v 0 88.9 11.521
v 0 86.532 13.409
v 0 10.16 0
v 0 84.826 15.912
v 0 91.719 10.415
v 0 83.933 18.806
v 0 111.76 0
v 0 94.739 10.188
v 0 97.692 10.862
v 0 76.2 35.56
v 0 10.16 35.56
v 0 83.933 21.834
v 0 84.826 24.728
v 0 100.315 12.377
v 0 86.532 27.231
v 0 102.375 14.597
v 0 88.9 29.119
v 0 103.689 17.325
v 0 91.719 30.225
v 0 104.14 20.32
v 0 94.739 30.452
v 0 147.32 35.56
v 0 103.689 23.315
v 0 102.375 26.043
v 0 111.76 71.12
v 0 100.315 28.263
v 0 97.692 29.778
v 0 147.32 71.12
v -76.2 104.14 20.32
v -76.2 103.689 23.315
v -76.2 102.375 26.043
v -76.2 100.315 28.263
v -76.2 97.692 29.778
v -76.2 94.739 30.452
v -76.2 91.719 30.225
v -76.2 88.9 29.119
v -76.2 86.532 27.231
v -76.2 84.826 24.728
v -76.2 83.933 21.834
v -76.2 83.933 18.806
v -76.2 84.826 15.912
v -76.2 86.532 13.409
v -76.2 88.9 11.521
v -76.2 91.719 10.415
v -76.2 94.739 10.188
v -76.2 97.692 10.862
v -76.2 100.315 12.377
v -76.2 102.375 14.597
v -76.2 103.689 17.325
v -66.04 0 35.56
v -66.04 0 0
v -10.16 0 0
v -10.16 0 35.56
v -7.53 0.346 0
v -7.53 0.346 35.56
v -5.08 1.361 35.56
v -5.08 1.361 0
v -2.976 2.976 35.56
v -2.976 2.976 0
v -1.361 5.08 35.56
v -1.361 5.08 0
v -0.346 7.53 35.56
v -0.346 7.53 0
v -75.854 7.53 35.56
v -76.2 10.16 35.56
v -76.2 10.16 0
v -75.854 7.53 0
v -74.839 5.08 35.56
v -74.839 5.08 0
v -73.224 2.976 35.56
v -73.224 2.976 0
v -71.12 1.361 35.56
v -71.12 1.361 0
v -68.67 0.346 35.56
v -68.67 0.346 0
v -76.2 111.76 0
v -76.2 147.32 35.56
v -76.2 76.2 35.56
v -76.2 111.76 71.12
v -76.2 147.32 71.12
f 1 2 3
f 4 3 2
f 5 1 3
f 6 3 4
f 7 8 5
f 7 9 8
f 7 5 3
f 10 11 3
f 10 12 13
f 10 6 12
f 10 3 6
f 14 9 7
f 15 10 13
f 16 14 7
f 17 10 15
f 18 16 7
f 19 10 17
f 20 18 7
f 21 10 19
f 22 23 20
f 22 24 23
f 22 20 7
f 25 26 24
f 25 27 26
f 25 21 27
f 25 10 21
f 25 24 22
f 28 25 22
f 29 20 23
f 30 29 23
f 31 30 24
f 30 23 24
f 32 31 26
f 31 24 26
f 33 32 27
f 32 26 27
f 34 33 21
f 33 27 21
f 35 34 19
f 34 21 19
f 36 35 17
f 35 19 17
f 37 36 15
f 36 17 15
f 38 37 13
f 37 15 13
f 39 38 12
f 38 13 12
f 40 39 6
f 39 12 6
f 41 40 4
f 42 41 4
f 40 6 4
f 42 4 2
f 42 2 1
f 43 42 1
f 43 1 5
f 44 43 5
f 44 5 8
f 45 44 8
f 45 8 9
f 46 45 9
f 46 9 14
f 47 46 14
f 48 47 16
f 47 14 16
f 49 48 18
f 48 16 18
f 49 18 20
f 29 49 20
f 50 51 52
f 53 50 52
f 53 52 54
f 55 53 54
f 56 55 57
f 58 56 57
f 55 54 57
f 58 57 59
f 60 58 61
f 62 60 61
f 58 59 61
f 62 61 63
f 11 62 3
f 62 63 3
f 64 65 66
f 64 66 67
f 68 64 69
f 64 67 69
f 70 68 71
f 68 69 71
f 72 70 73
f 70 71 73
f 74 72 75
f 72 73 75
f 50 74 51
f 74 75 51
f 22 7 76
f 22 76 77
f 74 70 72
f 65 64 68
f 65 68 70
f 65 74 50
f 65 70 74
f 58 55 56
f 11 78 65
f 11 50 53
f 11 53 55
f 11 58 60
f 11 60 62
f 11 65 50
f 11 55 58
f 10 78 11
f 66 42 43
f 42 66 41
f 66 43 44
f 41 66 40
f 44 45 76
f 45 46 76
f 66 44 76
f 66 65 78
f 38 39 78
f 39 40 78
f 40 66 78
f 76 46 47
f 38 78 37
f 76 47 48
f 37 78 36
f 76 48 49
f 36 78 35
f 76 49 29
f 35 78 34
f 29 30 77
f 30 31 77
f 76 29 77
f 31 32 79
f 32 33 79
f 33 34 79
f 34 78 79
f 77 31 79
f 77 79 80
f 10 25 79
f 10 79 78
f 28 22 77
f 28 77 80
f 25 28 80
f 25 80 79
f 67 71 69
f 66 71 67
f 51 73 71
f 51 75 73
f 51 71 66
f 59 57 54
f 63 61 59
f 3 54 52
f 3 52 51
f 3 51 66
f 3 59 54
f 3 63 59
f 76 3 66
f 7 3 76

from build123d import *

# Parameters (mm, degrees)
F2_DEPTH = 35.56
F0_R     = 10.16
F3_DEPTH = 76.2


# Not quite as in the source:
# - a feature names something its author has since deleted; it is built from what else it names


with BuildPart() as f2:
    # F1 (on Top) → F2 (new body)
    with BuildSketch(Plane.XY):
        with BuildLine():
            Line((0, 76.2), (-76.2, 76.2))
            Line((-76.2, 76.2), (-76.2, 10.16))
            ThreePointArc((-76.2, 10.16), (-73.2242048969, 2.9757951031), (-66.04, 0))
            Line((-66.04, 0), (-10.16, 0))
            ThreePointArc((-10.16, 0), (-2.9757951031, 2.9757951031), (0, 10.16))
            Line((0, 10.16), (0, 76.2))
        make_face()
    extrude(amount=F2_DEPTH)

    # F0 (on Right) → F3 (join)
    with BuildSketch(Plane.YZ):
        Polygon((76.2, 0), (111.76, 0), (147.32, 35.56), (147.32, 71.12), (111.76, 71.12), (76.2, 35.56), align=None)
        with Locations((93.98, 20.32)):
            Circle(F0_R, mode=Mode.SUBTRACT)
    extrude(amount=-F3_DEPTH)


solid = f2.part
